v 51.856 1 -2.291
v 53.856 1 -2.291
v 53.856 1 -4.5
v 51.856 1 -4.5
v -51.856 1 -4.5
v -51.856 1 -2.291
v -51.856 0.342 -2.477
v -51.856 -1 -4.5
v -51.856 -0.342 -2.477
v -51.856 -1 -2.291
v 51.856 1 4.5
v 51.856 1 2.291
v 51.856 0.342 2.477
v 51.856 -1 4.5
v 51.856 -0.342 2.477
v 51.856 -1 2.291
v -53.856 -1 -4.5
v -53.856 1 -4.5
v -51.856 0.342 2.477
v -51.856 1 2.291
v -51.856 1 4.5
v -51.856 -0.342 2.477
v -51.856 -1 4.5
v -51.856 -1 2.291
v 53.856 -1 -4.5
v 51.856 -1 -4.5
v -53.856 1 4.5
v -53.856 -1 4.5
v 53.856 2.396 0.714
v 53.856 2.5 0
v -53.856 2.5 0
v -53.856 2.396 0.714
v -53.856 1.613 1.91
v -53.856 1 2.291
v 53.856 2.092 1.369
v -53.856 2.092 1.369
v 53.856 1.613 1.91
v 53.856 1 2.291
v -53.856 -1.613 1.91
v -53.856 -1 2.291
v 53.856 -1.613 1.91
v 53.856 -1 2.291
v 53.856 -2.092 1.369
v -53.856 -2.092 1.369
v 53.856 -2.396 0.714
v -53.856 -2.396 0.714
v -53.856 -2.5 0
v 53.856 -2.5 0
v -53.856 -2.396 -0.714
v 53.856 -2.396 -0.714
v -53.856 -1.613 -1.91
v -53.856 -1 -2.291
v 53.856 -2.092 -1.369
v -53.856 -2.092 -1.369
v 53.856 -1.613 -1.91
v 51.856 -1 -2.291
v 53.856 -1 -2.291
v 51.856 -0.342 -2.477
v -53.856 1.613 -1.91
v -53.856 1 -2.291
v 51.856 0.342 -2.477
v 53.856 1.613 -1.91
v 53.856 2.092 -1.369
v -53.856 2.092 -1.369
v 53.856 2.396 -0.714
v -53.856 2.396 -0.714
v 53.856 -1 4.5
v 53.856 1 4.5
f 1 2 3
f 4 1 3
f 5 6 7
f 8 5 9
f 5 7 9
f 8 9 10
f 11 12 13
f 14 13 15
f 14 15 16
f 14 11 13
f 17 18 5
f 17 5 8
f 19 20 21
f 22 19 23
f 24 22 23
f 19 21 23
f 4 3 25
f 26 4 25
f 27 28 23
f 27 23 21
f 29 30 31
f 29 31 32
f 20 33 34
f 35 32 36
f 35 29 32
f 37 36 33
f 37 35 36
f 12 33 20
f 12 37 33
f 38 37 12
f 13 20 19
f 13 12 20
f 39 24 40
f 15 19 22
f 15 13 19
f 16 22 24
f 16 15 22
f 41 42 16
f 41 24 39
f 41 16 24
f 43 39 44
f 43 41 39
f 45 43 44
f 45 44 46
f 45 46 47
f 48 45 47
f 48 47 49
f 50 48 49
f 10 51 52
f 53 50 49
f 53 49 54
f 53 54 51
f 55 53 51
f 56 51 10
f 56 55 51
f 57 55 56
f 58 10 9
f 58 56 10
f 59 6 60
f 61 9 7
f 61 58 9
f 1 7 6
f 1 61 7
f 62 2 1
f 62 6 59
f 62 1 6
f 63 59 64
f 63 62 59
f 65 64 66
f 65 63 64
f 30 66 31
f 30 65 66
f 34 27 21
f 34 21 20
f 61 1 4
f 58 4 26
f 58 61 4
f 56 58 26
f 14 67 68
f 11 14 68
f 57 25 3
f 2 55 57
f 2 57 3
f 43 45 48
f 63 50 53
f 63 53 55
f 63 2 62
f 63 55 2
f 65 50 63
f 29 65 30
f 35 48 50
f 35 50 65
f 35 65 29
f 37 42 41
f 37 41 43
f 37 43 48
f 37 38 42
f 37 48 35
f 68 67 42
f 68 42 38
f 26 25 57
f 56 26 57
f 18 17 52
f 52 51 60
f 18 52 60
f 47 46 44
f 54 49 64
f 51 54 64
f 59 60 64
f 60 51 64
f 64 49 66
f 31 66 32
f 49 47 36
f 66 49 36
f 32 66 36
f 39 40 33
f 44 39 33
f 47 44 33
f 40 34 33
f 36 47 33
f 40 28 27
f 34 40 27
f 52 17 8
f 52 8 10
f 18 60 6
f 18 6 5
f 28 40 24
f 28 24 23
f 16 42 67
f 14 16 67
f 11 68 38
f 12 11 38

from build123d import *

# Parameters (mm, degrees)
F0_R     = 2.5
F1_DEPTH = 53.856
F3_DEPTH = 2


with BuildPart() as f1:
    # F0 (on Right) → F1 (new body, symmetric)
    with BuildSketch(Plane.YZ):
        Circle(F0_R)
    extrude(amount=F1_DEPTH, both=True)

    # F2 (on face) → F3 (join)
    with BuildSketch(Plane(origin=(-53.856, 0, 0), x_dir=(0, -1, 0), z_dir=(-1, 0, 0))):
        with BuildLine():
            ThreePointArc((-1, 2.291288), (0, 2.5), (1, 2.291288))
            Line((1, 2.291288), (1, 4.5))
            Line((1, 4.5), (-1, 4.5))
            Line((-1, 4.5), (-1, 2.291288))
        make_face()
        with BuildLine():
            Line((-1, -4.5), (1, -4.5))
            Line((1, -4.5), (1, -2.291288))
            ThreePointArc((1, -2.291288), (0, -2.5), (-1, -2.291288))
            Line((-1, -2.291288), (-1, -4.5))
        make_face()
    extrude(amount=-F3_DEPTH)

    # F4: F1 across plane


with BuildPart() as f1_1:
    add(f1.part)
    add(f1.part.mirror(Plane.YZ))


solid = f1_1.part
